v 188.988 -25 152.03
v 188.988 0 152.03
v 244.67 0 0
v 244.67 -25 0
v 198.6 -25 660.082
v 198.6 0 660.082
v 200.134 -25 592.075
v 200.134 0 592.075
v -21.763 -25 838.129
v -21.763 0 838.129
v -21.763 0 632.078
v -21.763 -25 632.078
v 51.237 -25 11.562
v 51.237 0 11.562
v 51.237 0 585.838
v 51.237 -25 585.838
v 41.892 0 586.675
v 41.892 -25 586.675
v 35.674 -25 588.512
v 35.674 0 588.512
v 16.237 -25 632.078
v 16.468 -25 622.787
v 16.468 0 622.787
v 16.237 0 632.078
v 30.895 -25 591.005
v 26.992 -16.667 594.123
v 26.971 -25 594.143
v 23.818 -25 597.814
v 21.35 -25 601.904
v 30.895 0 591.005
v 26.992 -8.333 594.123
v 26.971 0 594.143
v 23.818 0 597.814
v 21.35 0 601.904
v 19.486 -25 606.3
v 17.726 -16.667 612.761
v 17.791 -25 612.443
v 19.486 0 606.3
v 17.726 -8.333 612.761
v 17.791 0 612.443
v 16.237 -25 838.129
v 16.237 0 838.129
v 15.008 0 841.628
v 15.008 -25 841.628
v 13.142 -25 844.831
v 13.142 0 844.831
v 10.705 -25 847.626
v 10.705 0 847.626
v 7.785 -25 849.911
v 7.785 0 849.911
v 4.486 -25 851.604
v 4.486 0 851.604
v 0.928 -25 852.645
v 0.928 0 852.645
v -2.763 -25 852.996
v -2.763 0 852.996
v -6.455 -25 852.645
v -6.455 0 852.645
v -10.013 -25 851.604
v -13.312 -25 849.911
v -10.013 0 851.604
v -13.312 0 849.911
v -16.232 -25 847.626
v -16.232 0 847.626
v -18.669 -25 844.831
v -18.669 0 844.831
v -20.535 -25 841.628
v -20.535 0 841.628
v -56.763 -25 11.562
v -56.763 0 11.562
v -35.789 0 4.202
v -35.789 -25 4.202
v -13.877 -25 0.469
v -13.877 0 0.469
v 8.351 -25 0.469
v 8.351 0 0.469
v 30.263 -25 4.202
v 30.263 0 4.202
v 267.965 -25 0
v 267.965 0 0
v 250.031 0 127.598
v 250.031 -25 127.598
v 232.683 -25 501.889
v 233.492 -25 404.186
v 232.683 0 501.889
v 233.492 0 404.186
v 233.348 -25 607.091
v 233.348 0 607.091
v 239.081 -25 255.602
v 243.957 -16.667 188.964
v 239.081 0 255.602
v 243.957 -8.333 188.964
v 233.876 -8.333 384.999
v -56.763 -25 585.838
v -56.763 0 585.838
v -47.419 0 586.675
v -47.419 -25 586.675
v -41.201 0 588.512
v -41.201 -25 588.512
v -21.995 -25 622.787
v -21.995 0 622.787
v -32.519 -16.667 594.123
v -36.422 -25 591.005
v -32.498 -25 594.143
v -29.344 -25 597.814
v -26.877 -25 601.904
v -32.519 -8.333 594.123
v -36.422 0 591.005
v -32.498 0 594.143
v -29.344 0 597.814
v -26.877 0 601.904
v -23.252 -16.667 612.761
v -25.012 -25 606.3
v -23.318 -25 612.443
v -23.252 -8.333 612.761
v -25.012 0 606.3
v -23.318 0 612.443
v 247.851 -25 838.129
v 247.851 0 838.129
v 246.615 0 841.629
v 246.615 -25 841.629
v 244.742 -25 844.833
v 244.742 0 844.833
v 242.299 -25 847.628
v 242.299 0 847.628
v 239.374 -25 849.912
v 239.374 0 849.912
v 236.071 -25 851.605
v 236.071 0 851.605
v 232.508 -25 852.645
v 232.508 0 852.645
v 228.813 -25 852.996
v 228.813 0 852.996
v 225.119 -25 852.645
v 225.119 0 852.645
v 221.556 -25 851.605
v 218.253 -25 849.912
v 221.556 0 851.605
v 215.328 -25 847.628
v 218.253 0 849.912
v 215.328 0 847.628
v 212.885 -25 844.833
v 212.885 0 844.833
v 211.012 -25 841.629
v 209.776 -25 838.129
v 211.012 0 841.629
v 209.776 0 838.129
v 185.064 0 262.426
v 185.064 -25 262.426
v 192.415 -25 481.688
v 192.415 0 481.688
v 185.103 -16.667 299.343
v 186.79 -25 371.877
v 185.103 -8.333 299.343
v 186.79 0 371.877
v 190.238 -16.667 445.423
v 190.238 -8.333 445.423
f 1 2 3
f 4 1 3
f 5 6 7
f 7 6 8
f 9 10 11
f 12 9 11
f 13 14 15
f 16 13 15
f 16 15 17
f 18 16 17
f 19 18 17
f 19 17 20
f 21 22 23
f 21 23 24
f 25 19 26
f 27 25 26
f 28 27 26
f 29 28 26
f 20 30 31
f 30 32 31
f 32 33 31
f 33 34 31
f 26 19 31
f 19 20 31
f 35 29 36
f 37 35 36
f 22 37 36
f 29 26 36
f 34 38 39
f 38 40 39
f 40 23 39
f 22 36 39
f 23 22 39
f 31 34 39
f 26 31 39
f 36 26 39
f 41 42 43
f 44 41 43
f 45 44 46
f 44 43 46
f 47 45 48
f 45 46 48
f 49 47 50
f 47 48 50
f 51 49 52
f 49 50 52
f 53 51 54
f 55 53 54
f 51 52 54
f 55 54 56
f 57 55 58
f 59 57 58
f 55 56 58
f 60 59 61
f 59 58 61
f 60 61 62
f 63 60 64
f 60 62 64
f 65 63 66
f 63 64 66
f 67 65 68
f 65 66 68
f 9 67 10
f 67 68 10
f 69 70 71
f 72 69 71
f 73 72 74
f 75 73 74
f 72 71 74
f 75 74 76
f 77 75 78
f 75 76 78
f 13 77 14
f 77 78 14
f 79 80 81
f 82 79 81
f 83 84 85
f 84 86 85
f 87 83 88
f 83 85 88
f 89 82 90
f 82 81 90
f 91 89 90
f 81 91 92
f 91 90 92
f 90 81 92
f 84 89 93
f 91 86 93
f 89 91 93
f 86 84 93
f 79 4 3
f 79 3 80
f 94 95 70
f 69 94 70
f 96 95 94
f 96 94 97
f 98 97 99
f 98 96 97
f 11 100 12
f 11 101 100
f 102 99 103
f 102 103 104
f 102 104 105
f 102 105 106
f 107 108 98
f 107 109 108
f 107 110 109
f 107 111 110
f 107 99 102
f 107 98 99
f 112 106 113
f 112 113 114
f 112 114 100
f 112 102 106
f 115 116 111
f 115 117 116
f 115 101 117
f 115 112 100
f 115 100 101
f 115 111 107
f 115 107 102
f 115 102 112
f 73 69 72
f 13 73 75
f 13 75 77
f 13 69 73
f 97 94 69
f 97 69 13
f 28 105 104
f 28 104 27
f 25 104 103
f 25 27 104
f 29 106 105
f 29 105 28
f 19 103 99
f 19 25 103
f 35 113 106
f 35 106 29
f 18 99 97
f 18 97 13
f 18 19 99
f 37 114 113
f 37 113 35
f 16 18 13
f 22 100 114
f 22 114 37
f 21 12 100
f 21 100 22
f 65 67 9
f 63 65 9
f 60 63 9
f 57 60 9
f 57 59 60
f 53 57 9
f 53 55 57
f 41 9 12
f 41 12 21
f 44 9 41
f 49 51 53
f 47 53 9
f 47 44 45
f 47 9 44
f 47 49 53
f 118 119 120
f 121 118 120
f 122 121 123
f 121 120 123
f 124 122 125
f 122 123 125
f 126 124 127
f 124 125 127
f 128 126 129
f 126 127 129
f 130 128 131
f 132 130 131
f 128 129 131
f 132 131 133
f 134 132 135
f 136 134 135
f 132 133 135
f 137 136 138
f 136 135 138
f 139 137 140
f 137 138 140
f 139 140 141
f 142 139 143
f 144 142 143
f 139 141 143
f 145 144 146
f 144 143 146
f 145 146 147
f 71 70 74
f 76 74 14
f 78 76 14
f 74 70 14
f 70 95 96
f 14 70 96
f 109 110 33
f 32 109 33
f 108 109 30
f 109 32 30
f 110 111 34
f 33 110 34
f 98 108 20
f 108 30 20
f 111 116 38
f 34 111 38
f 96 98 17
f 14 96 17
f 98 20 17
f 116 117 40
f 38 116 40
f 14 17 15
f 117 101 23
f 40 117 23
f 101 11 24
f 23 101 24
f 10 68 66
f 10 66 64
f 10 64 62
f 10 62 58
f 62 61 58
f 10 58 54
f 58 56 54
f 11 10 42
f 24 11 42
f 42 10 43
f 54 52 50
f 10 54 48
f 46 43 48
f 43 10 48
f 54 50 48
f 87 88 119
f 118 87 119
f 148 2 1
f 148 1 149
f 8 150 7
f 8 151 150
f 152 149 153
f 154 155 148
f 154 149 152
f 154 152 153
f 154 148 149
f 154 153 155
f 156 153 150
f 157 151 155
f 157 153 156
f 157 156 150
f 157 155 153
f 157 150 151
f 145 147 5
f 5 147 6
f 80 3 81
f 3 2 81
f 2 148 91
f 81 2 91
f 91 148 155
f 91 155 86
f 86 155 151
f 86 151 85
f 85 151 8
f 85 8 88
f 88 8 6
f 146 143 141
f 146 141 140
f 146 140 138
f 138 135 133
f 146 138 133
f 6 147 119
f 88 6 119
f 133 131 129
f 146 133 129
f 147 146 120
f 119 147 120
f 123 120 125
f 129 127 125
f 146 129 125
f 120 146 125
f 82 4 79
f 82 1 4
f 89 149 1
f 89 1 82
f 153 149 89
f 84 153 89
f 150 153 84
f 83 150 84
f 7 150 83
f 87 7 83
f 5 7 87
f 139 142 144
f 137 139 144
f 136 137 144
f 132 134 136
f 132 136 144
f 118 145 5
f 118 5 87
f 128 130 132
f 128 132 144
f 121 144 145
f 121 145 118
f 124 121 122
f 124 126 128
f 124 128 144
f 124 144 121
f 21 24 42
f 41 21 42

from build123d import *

# Parameters (mm, degrees)
F1_DEPTH = 25


with BuildPart() as f1:
    # F0 (on Front) → F1 (new body)
    with BuildSketch(Plane.XZ):
        with BuildLine():
            Line((-56.763389, 585.838145), (-56.763389, 11.561857))
            ThreePointArc((-56.763389, 11.561857), (-2.763389, 0), (51.236611, 11.561857))
            Line((51.236611, 11.561857), (51.236611, 585.838145))
            add(Edge.make_bspline(
                [(51.236611, 585.838145), (17.103309, 585.720658), (16.236611, 615.647614), (16.236611, 632.078111)],
                knots=[0, 0, 0, 0, 57.992538, 57.992538, 57.992538, 57.992538], degree=3))
            Line((16.236611, 632.078111), (16.236611, 838.129222))
            ThreePointArc((16.236611, 838.129222), (-2.763389, 852.996262), (-21.763389, 838.129222))
            Line((-21.763389, 838.129222), (-21.763389, 632.078111))
            add(Edge.make_bspline(
                [(-56.763389, 585.838145), (-22.630086, 585.720658), (-21.763389, 615.647614), (-21.763389, 632.078111)],
                knots=[0, 0, 0, 0, 57.992538, 57.992538, 57.992538, 57.992538], degree=3))
        make_face()
        with BuildLine():
            Line((244.669899, 0), (267.965019, 0))
            add(Edge.make_bspline(
                [(267.965019, 0), (235.536397, 191.757724), (230.556713, 365.641733), (233.348013, 607.09085)],
                knots=[0, 0, 0, 0, 608.077, 608.077, 608.077, 608.077], degree=3))
            Line((233.348013, 607.09085), (247.850791, 838.129222))
            ThreePointArc((247.850791, 838.129222), (228.813394, 852.996262), (209.775998, 838.129222))
            Line((209.775998, 838.129222), (198.599619, 660.082468))
            Line((198.599619, 660.082468), (200.133637, 592.074513))
            add(Edge.make_bspline(
                [(188.988328, 152.030081), (179.173097, 300.561041), (189.277947, 444.535911), (200.133637, 592.074513)],
                knots=[0, 0, 0, 0, 440.185553, 440.185553, 440.185553, 440.185553], degree=3))
            Line((188.988328, 152.030081), (244.669899, 0))
        make_face()
    extrude(amount=F1_DEPTH)


solid = f1.part
